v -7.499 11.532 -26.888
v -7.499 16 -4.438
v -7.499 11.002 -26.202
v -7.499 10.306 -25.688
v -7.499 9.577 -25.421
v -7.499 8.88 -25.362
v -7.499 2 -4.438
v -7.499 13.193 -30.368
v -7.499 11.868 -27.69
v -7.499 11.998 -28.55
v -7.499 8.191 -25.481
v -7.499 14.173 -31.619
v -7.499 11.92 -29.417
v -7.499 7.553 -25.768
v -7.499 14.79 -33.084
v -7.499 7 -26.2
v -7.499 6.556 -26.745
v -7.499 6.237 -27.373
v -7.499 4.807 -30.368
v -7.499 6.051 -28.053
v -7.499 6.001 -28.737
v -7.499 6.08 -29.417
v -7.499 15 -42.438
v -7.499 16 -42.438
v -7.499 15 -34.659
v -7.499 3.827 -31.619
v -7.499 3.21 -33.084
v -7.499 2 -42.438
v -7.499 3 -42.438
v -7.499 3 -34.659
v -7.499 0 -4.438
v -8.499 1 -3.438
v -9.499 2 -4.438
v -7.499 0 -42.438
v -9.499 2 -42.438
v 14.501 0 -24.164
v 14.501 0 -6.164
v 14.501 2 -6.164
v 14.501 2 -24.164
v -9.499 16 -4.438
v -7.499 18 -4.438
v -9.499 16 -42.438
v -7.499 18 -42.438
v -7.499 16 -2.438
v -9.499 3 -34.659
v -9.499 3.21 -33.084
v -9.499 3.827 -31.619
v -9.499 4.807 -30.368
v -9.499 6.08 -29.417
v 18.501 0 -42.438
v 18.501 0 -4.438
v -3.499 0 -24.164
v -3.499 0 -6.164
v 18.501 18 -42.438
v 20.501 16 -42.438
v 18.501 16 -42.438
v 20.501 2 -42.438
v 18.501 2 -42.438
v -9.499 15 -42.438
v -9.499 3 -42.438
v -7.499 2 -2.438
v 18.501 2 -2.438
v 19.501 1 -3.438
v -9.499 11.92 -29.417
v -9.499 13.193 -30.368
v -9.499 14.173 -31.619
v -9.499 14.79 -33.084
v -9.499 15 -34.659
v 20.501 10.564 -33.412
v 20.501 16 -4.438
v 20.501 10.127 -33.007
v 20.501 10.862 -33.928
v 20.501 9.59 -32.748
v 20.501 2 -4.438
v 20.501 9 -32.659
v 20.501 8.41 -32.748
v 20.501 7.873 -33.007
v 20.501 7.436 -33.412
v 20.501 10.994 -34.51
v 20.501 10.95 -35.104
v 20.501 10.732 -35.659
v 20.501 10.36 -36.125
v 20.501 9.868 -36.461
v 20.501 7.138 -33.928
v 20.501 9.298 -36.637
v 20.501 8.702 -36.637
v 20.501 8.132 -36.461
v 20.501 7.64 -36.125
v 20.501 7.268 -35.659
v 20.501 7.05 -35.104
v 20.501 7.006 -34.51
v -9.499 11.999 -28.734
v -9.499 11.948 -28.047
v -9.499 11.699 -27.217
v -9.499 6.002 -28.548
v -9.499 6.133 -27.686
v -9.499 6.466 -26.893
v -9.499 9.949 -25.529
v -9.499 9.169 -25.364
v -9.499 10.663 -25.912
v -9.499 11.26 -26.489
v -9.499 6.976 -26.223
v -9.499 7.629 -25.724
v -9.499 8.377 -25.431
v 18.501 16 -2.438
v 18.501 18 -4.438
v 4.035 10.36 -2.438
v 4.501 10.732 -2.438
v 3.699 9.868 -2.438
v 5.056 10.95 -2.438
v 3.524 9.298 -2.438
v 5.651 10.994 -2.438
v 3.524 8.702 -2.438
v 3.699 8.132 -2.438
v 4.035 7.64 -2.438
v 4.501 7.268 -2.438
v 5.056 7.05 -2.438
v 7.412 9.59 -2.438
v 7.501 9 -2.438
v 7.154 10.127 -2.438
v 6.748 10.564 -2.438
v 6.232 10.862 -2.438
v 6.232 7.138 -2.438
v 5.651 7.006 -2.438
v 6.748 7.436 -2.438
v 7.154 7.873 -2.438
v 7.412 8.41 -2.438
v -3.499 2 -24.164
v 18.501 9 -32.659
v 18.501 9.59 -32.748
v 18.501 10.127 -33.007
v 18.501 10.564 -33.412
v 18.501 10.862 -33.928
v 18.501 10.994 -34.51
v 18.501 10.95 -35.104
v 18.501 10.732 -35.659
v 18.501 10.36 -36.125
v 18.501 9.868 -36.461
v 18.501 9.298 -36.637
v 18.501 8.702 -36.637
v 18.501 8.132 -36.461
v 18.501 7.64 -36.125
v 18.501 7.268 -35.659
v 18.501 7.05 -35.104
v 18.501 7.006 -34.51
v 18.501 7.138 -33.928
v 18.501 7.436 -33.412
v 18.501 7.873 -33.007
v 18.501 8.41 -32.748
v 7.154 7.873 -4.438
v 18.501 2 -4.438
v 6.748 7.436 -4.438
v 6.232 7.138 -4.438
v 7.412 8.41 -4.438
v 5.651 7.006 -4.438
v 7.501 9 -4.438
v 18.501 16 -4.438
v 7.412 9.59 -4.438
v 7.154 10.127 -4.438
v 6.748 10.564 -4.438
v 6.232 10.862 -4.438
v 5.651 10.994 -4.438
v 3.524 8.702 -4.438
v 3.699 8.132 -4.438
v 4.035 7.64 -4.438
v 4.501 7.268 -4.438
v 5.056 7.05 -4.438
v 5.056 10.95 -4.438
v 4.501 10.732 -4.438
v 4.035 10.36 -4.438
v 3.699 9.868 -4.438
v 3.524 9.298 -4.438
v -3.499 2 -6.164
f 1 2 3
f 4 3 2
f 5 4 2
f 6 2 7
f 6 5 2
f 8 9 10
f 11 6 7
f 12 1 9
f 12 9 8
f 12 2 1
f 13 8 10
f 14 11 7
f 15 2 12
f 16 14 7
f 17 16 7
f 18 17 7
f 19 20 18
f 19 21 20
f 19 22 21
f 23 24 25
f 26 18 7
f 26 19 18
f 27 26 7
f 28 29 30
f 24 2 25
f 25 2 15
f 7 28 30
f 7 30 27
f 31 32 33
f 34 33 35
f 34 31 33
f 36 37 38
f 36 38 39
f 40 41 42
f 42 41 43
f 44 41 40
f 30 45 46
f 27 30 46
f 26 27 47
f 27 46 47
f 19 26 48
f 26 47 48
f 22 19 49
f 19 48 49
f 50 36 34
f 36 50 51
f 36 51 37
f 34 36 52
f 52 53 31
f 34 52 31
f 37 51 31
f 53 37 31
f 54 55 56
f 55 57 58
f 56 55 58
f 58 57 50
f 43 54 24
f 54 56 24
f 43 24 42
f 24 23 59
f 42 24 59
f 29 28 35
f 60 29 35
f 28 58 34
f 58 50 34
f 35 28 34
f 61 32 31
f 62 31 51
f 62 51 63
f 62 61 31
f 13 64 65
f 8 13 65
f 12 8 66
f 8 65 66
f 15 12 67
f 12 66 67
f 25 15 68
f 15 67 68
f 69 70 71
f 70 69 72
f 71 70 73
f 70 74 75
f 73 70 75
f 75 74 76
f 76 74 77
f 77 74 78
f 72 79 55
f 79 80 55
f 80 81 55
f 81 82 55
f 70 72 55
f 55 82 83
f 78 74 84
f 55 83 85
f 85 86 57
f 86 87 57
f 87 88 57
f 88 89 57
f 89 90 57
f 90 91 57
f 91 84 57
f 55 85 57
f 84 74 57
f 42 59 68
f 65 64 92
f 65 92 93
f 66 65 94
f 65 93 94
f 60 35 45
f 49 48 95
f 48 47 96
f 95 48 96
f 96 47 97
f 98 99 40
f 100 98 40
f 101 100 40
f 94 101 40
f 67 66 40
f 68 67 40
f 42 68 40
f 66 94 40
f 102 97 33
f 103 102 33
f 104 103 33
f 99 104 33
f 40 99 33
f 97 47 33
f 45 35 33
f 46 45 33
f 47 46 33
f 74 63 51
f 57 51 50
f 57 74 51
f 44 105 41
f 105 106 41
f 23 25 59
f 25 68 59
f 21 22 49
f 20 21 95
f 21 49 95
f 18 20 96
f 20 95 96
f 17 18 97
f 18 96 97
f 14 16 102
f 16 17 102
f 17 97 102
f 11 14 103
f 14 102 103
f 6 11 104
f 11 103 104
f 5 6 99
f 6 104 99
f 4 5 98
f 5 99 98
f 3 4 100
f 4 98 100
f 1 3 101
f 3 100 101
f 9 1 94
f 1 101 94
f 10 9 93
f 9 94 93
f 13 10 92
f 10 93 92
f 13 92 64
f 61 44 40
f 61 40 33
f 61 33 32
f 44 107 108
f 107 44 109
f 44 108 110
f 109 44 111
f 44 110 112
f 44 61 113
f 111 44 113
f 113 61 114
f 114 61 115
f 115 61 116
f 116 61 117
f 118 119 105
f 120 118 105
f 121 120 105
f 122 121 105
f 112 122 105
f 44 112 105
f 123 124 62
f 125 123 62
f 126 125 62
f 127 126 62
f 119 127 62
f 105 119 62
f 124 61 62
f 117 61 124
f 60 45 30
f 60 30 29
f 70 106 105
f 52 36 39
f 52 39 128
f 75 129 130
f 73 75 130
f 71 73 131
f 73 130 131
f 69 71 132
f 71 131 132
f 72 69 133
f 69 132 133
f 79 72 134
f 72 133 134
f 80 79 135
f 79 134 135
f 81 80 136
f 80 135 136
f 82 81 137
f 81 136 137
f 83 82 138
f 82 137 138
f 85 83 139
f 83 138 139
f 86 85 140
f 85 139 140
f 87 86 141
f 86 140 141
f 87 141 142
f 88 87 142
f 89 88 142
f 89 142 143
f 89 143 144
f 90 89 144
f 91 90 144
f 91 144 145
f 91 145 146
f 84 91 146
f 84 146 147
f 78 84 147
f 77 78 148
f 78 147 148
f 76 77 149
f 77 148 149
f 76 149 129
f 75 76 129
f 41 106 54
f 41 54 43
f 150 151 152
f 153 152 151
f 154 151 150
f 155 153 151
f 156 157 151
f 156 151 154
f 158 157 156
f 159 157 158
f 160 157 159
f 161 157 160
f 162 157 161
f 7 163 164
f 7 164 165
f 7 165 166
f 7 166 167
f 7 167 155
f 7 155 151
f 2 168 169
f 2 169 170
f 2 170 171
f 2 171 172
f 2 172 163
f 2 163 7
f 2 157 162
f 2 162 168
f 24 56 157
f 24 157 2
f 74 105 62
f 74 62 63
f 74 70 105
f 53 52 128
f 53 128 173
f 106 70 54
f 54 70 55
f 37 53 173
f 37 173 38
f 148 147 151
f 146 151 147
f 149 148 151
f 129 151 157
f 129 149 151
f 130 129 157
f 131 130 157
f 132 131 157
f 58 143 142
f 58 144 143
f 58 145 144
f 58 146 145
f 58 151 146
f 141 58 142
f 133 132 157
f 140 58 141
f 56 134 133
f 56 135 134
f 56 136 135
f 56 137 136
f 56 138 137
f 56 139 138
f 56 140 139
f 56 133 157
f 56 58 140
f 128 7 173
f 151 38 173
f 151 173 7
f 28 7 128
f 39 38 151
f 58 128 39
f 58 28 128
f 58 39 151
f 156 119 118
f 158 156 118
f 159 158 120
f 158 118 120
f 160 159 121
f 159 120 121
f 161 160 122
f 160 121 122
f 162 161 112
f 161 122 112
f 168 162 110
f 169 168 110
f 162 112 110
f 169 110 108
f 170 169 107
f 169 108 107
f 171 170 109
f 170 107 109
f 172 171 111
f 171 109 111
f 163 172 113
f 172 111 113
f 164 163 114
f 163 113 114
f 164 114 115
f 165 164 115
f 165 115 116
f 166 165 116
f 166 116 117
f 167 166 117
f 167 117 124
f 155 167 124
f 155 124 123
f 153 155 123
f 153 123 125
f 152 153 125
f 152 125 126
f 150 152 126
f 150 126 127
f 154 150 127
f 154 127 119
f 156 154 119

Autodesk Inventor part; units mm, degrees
ref_plane "YZ Plane" through (0, 0, 0) normal (1, 0, 0) x (0, 1, 0)
ref_plane "XZ Plane" through (0, 0, 0) normal (0, 1, 0) x (-1, 0, 0)
ref_plane "XY Plane" through (0, 0, 0) normal (0, 0, 1) x (1, 0, 0)
sketch "Esboço1" plane through (0, 0, 0) normal (0, 1, 0) x (-1, 0, 0)
  line L0 (9.4987, -2.4377) -> (-20.5013, -2.4377)
  line L1 (-20.5013, -2.4377) -> (-20.5013, -42.4377)
  line L2 (-20.5013, -42.4377) -> (9.4987, -42.4377)
  line L3 (9.4987, -42.4377) -> (9.4987, -2.4377)
  point P0 (0, 0)
  dimension "d0" = 30
  dimension "d1" = 40
extrude "Extrusão1" add sketch "Esboço1" along normal blind 18
sketch "Esboço2" plane through (20.5013, 0, -42.4377) normal (0, 0, -1) x (-1, 0, 0)
  line L0 (28, 2) -> (2, 2)
  line L1 (2, 2) -> (2, 16)
  line L2 (2, 16) -> (28, 16)
  line L3 (28, 16) -> (28, 2)
  line L4 (0, 0) -> (30, 0) projected
  line L5 (0, 18) -> (30, 18) projected
  line L6 (0, 0) -> (0, 18) projected
  line L7 (30, 0) -> (30, 18) projected
  point P0 (20.5013, 0)
  dimension "d4" = 2
  dimension "d5" = 2
  dimension "d6" = 2
  dimension "d7" = 2
extrude "Extrusão2" cut sketch "Esboço2" against normal blind 38 contours L0 L1 L2 L3
chamfer "Chanfro1" distance 2 angle 45 7 edges at (-9.4987, 18, -22.4377) (-9.4987, 0, -22.4377) (5.5013, 18, -2.4377) (-9.4987, 9, -2.4377) (20.5013, 18, -22.4377) (20.5013, 9, -2.4377) (20.5013, 0, -22.4377)
chamfer "Chanfro2" distance 2 angle 45 1 edges at (5.5013, 0, -2.4377)
sketch "Esboço3" plane through (0, 0, 0) normal (0, -1, 0) x (1, 0, 0)
  line L0 (-3.4987, -6.1642) -> (14.5013, -6.1642)
  line L1 (14.5013, -6.1642) -> (14.5013, -24.1642)
  line L2 (14.5013, -24.1642) -> (-3.4987, -24.1642)
  line L3 (-3.4987, -24.1642) -> (-3.4987, -6.1642)
  line L4 (-7.4987, -42.4377) -> (-7.4987, -4.4377) projected
  point P0 (0, 0)
  dimension "d16" = 18
  dimension "d17" = 18
  dimension "d18" = 4
extrude "Extrusão3" cut sketch "Esboço3" against normal blind 5
sketch "Esboço4" plane through (-9.4987, 2, -42.4377) normal (-1, 0, 0) x (0, 0, 1)
  line L0 (0, 14) -> (38, 14) projected
  line L1 (7.7786, 13) -> (0, 13)
  line L2 (7.7786, 1) -> (0, 1)
  line L3 (0, 0) -> (0, 14) projected
  ellipse E0 centre (13.7786, 7) end of major axis (13.7786, 10) minor radius 3.3 (13.0203, 4.0803) -> (13.0203, 9.9197) ccw
  arc A0 (7.7786, 1) -> (13.0203, 4.0803) centre (7.7786, 7) ccw
  arc A1 (13.0203, 9.9197) -> (7.7786, 13) centre (7.7786, 7) ccw
  circle A2 centre (7.7786, 7) radius 2
  point P0 (42.4377, -2)
  dimension "d23" = 3.3
  dimension "d24" = 3
  dimension "d22" = 7
  dimension "d25" = 4
extrude "Extrusão4" cut sketch "Esboço4" against normal blind 5
sketch "Esboço5" plane through (-9.4987, 9, -34.6591) normal (-1, 0, 0) x (0, 0, 1)
  circle A0 centre (0, 0) radius 2 projected
  circle A1 centre (0, 0) radius 2
  point P0 (34.6591, -9)
extrude "Extrusão5" cut sketch "Esboço5" against normal blind 69
sketch "Esboço6" plane through (-7.4987, 16, -2.4377) normal (0, 0, 1) x (1, 0, 0)
  line L0 (0, -4) -> (0, -10) construction
  line L1 (0, -7) -> (26, -7) construction
  line L2 (26, -9) -> (26, -5) construction
  line L3 (22, -14) -> (4, -14) construction
  line L4 (13, -14) -> (13, 0) construction
  line L5 (26, 0) -> (0, 0) construction
  circle A0 centre (13, -7) radius 2
  point P0 (7.4987, -16)
  point P1 (0, -9.9197)
  point P2 (0, -4.0803)
  dimension "d30" = 4
extrude "Extrusão6" cut sketch "Esboço6" against normal blind 10
properties part number "Pernotta"
